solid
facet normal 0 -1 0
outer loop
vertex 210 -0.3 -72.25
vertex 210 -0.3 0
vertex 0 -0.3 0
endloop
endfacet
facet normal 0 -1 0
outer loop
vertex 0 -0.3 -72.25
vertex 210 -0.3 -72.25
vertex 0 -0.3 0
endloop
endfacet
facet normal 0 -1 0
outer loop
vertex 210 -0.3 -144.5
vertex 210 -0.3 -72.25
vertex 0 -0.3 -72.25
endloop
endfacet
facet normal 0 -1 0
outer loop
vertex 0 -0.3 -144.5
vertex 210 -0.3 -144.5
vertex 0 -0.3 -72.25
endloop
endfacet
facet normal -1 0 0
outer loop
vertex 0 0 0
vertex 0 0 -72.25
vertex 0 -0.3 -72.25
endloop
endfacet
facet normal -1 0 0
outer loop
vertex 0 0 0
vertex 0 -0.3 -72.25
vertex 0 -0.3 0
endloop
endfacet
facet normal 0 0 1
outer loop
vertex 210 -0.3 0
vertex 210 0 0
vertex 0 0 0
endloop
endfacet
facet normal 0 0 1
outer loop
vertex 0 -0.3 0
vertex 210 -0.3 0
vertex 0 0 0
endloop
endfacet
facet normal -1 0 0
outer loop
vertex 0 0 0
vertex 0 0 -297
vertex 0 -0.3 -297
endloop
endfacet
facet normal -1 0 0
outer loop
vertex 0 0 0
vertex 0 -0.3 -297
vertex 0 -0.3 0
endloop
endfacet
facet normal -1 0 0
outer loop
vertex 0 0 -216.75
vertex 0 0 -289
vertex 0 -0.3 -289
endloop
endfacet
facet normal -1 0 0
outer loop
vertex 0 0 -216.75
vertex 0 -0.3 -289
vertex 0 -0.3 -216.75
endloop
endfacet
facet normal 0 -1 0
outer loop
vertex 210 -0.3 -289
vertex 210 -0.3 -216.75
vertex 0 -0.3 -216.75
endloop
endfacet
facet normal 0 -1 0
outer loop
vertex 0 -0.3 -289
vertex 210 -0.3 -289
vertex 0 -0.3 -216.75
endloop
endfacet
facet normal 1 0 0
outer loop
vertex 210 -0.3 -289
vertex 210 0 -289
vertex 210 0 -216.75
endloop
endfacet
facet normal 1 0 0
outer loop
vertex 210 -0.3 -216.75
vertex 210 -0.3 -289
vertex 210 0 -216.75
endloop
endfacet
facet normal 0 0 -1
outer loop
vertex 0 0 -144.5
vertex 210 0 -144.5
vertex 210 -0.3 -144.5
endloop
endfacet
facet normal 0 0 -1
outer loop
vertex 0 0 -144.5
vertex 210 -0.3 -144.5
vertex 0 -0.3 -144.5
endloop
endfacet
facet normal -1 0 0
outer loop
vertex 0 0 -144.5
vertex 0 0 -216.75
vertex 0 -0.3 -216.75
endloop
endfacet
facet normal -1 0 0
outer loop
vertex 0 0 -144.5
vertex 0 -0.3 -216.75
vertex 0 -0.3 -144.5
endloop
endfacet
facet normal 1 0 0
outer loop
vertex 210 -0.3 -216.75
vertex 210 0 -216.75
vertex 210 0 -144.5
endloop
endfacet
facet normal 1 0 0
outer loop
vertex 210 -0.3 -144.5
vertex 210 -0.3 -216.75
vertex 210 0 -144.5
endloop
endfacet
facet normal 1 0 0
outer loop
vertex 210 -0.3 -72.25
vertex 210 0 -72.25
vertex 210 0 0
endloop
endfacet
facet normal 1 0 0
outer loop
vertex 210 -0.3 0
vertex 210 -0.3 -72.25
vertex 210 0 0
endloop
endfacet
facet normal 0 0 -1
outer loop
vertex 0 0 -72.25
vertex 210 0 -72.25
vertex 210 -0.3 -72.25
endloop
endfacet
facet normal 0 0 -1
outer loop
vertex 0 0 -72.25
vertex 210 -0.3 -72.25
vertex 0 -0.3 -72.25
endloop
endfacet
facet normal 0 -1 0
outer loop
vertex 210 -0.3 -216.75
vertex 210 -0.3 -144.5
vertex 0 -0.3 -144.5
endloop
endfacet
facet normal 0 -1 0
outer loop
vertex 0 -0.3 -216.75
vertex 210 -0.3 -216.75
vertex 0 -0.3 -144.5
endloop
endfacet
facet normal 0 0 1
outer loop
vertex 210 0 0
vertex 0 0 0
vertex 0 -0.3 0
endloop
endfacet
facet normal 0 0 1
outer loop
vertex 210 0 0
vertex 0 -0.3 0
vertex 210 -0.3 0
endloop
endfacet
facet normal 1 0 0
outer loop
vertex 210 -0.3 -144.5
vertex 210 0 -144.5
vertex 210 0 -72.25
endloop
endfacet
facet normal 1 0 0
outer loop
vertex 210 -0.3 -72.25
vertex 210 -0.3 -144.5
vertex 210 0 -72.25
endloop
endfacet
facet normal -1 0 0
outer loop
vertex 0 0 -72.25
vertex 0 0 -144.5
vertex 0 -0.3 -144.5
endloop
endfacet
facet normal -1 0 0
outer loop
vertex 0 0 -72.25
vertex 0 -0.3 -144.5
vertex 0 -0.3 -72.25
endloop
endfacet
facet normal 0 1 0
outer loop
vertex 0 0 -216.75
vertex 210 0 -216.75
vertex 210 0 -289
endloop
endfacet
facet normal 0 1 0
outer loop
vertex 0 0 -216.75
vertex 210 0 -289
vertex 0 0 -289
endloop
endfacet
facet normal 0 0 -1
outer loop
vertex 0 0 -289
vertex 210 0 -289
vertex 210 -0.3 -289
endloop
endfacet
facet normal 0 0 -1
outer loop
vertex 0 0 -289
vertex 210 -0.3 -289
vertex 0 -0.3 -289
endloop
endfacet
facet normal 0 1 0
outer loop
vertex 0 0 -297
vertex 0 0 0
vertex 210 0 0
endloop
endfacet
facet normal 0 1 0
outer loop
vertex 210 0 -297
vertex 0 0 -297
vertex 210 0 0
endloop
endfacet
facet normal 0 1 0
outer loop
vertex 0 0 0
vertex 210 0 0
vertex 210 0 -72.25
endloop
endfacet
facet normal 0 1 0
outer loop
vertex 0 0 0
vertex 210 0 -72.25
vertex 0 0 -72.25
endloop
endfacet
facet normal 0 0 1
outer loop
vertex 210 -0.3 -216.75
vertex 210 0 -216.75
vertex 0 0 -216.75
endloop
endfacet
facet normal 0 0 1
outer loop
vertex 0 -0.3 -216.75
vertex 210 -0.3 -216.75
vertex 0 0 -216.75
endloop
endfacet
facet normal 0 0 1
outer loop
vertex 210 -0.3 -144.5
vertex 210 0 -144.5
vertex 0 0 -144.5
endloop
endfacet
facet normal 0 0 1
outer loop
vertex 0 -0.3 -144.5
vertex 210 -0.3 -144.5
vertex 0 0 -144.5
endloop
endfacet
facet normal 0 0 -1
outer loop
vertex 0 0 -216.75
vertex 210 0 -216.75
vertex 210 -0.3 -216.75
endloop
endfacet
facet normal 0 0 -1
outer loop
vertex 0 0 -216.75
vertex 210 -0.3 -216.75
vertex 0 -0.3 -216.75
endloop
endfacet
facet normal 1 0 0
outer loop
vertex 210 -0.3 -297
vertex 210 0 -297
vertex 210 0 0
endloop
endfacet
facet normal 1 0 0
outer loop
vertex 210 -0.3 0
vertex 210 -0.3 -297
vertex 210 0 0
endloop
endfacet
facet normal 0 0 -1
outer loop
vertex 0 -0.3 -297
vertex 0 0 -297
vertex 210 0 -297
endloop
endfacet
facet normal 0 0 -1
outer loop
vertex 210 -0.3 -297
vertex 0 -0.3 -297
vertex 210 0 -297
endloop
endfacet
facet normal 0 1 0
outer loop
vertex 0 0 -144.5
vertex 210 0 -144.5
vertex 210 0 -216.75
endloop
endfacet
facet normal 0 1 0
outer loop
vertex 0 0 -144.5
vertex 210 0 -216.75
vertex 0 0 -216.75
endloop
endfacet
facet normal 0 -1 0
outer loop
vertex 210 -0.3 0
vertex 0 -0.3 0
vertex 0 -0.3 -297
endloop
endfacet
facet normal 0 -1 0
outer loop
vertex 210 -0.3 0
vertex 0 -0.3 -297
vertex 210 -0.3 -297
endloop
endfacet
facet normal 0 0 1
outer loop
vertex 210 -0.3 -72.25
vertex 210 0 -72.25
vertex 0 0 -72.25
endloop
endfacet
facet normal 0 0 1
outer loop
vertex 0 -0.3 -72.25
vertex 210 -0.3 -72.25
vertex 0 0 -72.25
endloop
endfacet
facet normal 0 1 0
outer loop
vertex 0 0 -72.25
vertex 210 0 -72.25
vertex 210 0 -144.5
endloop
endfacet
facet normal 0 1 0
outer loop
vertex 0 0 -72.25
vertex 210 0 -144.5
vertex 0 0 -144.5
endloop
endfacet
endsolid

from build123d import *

# Parameters (mm, degrees)
F0_W     = 210
F0_H     = 297
F1_DEPTH = 0.3
F2_W     = 210
F2_H     = 72.25
F3_DEPTH = 0.3
F4_DEPTH = 0.3
F5_DEPTH = 0.3
F6_DEPTH = 0.3


with BuildPart() as f1:
    # F0 (on Front) → F1 (new body)
    with BuildSketch(Plane.XZ):
        with Locations((105, -148.5)):
            Rectangle(F0_W, F0_H)
    extrude(amount=F1_DEPTH)


with BuildPart() as f3:
    # F2 (on face) → F3 (new body)
    with BuildSketch(Plane(origin=(0, 0, 0), x_dir=(-1, 0, 0), z_dir=(0, 1, 0))):
        with Locations((-105, -36.125)):
            Rectangle(F2_W, F2_H)
    extrude(amount=-F3_DEPTH)


with BuildPart() as f4:
    # F2 (on face) → F4 (new body)
    with BuildSketch(Plane(origin=(0, 0, 0), x_dir=(-1, 0, 0), z_dir=(0, 1, 0))):
        with Locations((-105, -108.375)):
            Rectangle(F2_W, F2_H)
    extrude(amount=-F4_DEPTH)


with BuildPart() as f5:
    # F2 (on face) → F5 (new body)
    with BuildSketch(Plane(origin=(0, 0, 0), x_dir=(-1, 0, 0), z_dir=(0, 1, 0))):
        with Locations((-105, -180.625)):
            Rectangle(F2_W, F2_H)
    extrude(amount=-F5_DEPTH)


with BuildPart() as f6:
    # F2 (on face) → F6 (new body)
    with BuildSketch(Plane(origin=(0, 0, 0), x_dir=(-1, 0, 0), z_dir=(0, 1, 0))):
        with Locations((-105, -252.875)):
            Rectangle(F2_W, F2_H)
    extrude(amount=-F6_DEPTH)


solid = Compound([f1.part, f3.part, f4.part, f5.part, f6.part])
